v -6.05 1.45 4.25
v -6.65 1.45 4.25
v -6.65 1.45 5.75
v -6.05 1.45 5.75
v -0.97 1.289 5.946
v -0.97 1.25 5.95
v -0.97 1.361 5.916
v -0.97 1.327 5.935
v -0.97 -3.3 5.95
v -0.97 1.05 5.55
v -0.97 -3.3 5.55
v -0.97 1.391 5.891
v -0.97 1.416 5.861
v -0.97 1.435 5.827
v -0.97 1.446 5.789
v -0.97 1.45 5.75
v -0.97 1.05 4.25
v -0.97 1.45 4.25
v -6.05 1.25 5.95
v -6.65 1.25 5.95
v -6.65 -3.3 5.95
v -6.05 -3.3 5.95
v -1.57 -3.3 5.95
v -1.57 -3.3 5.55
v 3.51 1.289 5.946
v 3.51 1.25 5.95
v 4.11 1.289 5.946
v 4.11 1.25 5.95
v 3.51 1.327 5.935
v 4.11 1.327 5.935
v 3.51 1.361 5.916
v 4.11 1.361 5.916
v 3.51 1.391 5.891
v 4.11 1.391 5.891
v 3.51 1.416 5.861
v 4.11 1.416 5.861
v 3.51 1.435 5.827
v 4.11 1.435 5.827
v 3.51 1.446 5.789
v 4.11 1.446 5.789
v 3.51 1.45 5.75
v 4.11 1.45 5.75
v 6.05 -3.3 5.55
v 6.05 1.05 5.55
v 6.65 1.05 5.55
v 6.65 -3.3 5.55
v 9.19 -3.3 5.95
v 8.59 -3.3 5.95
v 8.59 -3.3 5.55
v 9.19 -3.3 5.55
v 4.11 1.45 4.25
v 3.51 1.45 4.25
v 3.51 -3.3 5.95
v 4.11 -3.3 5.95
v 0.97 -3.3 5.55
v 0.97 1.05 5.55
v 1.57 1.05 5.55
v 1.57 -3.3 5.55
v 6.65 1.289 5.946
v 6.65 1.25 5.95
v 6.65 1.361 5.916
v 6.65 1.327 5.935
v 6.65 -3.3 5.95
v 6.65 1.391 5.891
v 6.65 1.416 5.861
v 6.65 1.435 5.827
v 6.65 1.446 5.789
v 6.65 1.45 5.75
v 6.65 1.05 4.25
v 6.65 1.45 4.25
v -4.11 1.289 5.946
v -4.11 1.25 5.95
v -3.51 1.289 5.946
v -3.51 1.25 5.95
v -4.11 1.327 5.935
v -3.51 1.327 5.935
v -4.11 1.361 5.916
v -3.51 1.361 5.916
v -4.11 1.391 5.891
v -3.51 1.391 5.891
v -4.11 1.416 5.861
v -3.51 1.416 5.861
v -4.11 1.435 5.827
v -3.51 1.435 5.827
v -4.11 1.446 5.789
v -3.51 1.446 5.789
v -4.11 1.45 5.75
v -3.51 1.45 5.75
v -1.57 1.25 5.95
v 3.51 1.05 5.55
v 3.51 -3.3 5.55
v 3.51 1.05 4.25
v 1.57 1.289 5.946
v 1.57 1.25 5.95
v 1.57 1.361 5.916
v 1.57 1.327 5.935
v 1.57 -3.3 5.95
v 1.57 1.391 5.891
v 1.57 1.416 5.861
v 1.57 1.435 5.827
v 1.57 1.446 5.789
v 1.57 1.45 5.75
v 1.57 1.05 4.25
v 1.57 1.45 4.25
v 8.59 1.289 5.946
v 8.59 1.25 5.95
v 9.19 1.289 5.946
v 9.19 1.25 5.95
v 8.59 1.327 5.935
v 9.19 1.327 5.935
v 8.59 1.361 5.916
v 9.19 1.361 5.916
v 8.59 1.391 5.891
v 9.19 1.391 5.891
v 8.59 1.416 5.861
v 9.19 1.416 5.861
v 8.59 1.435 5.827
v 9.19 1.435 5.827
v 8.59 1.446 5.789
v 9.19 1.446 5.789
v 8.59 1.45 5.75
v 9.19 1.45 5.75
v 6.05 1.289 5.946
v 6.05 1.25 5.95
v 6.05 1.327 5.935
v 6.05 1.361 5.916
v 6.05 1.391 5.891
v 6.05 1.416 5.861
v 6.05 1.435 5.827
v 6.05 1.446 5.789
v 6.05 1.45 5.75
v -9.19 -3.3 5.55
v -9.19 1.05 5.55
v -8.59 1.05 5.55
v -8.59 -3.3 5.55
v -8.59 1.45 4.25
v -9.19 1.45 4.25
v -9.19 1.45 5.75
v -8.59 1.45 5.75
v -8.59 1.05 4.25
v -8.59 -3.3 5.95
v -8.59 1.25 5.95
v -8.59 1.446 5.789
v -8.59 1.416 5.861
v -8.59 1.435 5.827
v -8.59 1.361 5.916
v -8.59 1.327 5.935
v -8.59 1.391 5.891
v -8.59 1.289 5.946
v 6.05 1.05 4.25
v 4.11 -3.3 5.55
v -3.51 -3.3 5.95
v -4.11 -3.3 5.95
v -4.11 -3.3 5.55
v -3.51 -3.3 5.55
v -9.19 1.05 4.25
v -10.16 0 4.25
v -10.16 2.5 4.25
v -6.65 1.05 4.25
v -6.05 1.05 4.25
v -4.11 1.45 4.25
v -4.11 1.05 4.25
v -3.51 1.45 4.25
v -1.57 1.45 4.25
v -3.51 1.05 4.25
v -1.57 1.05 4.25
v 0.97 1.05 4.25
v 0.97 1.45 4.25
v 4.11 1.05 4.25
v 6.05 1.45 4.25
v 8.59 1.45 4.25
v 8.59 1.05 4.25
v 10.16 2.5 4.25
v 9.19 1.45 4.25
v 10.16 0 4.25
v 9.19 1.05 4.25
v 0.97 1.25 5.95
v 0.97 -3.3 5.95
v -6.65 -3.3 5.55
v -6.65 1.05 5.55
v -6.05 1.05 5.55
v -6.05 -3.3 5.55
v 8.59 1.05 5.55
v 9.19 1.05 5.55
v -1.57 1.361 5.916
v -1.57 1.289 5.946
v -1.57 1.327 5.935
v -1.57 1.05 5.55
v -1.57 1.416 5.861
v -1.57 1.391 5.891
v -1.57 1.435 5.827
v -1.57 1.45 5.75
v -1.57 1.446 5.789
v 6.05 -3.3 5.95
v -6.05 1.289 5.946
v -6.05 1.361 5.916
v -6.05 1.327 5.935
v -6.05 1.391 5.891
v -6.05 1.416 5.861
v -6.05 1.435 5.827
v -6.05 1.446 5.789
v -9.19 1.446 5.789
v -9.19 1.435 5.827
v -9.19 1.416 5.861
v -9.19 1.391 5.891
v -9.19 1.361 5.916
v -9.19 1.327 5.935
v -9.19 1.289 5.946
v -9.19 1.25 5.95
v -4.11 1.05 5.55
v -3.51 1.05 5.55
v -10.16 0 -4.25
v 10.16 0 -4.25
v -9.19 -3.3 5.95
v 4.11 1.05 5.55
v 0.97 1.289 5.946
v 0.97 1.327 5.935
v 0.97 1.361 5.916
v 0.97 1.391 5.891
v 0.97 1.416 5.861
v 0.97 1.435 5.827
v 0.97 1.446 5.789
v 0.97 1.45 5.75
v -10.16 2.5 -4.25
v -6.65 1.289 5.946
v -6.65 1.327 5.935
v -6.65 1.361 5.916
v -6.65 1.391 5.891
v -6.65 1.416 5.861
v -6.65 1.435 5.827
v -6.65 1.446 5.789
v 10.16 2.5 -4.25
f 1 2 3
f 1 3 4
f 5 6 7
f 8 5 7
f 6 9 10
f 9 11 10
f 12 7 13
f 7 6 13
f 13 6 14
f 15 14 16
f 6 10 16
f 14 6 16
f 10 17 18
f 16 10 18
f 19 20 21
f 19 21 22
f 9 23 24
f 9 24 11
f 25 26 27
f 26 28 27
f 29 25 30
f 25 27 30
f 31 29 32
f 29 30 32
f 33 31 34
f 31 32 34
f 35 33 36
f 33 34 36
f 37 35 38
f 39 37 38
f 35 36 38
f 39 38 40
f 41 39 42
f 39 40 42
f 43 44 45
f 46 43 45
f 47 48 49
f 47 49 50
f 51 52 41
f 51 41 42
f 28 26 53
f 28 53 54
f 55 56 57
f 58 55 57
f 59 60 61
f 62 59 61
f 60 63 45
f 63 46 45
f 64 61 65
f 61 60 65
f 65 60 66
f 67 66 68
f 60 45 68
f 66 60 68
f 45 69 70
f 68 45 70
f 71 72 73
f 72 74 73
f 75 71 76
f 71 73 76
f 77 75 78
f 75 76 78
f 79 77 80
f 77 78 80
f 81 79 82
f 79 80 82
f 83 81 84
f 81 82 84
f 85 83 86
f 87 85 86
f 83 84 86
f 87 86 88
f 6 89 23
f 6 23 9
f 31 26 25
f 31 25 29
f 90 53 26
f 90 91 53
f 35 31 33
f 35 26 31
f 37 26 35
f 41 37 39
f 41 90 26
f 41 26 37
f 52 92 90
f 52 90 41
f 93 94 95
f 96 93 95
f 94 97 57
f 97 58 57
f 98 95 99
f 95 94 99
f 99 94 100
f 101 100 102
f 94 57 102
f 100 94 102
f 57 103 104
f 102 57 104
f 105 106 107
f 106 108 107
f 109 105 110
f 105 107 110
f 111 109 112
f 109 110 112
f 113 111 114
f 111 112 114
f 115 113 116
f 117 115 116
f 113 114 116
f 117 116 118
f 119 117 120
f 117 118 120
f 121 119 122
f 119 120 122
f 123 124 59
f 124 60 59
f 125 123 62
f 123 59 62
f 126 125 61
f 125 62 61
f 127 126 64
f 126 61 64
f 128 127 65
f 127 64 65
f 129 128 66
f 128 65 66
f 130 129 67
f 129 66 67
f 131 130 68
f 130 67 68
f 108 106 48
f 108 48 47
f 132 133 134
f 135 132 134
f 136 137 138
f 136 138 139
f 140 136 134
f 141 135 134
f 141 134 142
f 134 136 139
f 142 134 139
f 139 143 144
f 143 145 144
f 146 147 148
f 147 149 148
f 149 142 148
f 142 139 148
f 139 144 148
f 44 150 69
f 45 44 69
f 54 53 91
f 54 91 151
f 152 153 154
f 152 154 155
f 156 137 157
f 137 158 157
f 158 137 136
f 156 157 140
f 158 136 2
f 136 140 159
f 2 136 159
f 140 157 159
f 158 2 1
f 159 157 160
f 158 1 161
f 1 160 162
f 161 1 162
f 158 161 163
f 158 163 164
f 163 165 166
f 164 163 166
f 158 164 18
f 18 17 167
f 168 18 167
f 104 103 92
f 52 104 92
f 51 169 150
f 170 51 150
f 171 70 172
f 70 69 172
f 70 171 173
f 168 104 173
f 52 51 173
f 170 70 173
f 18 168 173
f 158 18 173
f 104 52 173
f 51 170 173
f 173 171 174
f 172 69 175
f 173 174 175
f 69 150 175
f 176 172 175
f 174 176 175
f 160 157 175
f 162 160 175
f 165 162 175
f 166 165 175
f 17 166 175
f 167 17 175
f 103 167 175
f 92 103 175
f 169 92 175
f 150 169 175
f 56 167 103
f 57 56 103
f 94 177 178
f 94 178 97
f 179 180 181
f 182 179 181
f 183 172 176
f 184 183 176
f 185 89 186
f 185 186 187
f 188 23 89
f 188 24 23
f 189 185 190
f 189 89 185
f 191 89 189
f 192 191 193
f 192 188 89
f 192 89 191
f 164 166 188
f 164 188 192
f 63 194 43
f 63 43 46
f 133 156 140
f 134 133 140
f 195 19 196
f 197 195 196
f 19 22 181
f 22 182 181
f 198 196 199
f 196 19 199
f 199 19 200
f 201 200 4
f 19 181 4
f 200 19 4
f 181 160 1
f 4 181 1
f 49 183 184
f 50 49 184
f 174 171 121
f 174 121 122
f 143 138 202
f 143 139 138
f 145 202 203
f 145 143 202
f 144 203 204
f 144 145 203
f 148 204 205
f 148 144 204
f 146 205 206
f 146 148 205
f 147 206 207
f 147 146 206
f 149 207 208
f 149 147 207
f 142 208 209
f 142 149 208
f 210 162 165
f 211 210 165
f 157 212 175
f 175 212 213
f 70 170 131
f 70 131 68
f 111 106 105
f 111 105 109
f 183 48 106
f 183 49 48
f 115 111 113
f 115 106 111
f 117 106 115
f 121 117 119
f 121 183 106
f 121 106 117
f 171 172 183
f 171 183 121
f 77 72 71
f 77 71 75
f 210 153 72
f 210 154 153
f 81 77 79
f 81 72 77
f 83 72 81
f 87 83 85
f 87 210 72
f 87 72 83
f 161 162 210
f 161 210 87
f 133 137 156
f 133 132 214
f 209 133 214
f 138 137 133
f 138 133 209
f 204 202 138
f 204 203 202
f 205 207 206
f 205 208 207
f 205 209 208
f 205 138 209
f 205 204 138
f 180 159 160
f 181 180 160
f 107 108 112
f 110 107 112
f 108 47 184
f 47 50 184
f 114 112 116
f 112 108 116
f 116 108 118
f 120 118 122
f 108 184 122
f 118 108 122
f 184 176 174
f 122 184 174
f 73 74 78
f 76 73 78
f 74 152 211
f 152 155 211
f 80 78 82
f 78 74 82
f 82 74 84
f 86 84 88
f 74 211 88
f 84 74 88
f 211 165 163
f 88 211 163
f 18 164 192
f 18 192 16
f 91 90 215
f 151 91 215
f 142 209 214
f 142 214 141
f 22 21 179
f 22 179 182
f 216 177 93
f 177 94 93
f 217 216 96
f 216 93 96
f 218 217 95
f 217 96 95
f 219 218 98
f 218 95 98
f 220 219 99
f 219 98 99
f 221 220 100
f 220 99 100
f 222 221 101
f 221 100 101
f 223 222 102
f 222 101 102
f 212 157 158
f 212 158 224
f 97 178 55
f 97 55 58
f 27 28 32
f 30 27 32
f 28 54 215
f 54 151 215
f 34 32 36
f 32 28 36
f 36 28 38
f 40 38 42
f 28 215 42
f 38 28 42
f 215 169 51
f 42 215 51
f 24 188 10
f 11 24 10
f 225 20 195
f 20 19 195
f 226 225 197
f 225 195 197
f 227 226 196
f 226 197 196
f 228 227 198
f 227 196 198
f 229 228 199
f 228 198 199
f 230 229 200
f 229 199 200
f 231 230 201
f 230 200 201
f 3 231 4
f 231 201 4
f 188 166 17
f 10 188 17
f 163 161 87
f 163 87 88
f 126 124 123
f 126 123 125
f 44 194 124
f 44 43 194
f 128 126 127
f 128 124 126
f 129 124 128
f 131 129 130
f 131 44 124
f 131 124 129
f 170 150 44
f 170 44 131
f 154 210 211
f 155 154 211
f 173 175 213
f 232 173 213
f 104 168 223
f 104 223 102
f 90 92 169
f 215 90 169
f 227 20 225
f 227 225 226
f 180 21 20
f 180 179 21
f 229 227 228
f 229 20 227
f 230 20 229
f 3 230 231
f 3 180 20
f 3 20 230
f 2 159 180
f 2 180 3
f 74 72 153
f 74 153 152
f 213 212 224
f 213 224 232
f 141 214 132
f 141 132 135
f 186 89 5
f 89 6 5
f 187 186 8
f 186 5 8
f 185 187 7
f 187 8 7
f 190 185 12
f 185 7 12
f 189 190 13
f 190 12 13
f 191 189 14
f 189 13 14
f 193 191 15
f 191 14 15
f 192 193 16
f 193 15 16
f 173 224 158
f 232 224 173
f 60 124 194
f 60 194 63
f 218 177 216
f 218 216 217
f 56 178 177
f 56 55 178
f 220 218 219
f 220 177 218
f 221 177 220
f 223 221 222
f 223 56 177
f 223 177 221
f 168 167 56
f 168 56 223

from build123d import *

# Parameters (mm, degrees)
SKETCH_1_W      = 20.32
SKETCH_1_H      = 8.5
EXTRUDE_1_DEPTH = 2.5
SKETCH_2_W      = 0.6
SKETCH_2_H      = 0.4
EXTRUDE_2_DEPTH = 1.7
SKETCH_3_W      = 0.6
SKETCH_3_H      = 0.4
EXTRUDE_3_DEPTH = 4.35
FILLET_1_R      = 0.2


with BuildPart() as part:
    # Эскиз1 → Бобышка-Вытянуть1 (new body)
    with BuildSketch(Plane(origin=(0, 0, 0), x_dir=(1, 0, 0), z_dir=(0, 1, 0))):
        Rectangle(SKETCH_1_W, SKETCH_1_H)
    extrude(amount=EXTRUDE_1_DEPTH)

    # Эскиз2 → Бобышка-Вытянуть2 (add)
    with BuildSketch(Plane.XY.offset(4.25)):
        with Locations((-6.35, 1.25)):
            Rectangle(SKETCH_2_W, SKETCH_2_H)
        with Locations((-8.89, 1.25)):
            Rectangle(SKETCH_2_W, SKETCH_2_H)
        with Locations((-3.81, 1.25)):
            Rectangle(SKETCH_2_W, SKETCH_2_H)
        with Locations((-1.27, 1.25)):
            Rectangle(SKETCH_2_W, SKETCH_2_H)
        with Locations((1.27, 1.25)):
            Rectangle(SKETCH_2_W, SKETCH_2_H)
        with Locations((3.81, 1.25)):
            Rectangle(SKETCH_2_W, SKETCH_2_H)
        with Locations((6.35, 1.25)):
            Rectangle(SKETCH_2_W, SKETCH_2_H)
        with Locations((8.89, 1.25)):
            Rectangle(SKETCH_2_W, SKETCH_2_H)
    extrude(amount=EXTRUDE_2_DEPTH)

    # Эскиз3 → Бобышка-Вытянуть3 (add)
    with BuildSketch(Plane.XZ.offset(-1.05)):
        with Locations((-8.89, 5.75)):
            Rectangle(SKETCH_3_W, SKETCH_3_H)
        with Locations((-6.35, 5.75)):
            Rectangle(SKETCH_3_W, SKETCH_3_H)
        with Locations((-3.81, 5.75)):
            Rectangle(SKETCH_3_W, SKETCH_3_H)
        with Locations((-1.27, 5.75)):
            Rectangle(SKETCH_3_W, SKETCH_3_H)
        with Locations((1.27, 5.75)):
            Rectangle(SKETCH_3_W, SKETCH_3_H)
        with Locations((3.81, 5.75)):
            Rectangle(SKETCH_3_W, SKETCH_3_H)
        with Locations((6.35, 5.75)):
            Rectangle(SKETCH_3_W, SKETCH_3_H)
        with Locations((8.89, 5.75)):
            Rectangle(SKETCH_3_W, SKETCH_3_H)
    extrude(amount=EXTRUDE_3_DEPTH)

    # Скругление1
    fillet_1_edges = [part.edges().sort_by_distance(p)[0] for p in [
        (-8.89, 1.45, 5.95),
        (-6.35, 1.45, 5.95),
        (-3.81, 1.45, 5.95),
        (-1.27, 1.45, 5.95),
        (1.27, 1.45, 5.95),
        (3.81, 1.45, 5.95),
        (6.35, 1.45, 5.95),
        (8.89, 1.45, 5.95),
    ]]
    fillet(fillet_1_edges, radius=FILLET_1_R)


solid = part.part
